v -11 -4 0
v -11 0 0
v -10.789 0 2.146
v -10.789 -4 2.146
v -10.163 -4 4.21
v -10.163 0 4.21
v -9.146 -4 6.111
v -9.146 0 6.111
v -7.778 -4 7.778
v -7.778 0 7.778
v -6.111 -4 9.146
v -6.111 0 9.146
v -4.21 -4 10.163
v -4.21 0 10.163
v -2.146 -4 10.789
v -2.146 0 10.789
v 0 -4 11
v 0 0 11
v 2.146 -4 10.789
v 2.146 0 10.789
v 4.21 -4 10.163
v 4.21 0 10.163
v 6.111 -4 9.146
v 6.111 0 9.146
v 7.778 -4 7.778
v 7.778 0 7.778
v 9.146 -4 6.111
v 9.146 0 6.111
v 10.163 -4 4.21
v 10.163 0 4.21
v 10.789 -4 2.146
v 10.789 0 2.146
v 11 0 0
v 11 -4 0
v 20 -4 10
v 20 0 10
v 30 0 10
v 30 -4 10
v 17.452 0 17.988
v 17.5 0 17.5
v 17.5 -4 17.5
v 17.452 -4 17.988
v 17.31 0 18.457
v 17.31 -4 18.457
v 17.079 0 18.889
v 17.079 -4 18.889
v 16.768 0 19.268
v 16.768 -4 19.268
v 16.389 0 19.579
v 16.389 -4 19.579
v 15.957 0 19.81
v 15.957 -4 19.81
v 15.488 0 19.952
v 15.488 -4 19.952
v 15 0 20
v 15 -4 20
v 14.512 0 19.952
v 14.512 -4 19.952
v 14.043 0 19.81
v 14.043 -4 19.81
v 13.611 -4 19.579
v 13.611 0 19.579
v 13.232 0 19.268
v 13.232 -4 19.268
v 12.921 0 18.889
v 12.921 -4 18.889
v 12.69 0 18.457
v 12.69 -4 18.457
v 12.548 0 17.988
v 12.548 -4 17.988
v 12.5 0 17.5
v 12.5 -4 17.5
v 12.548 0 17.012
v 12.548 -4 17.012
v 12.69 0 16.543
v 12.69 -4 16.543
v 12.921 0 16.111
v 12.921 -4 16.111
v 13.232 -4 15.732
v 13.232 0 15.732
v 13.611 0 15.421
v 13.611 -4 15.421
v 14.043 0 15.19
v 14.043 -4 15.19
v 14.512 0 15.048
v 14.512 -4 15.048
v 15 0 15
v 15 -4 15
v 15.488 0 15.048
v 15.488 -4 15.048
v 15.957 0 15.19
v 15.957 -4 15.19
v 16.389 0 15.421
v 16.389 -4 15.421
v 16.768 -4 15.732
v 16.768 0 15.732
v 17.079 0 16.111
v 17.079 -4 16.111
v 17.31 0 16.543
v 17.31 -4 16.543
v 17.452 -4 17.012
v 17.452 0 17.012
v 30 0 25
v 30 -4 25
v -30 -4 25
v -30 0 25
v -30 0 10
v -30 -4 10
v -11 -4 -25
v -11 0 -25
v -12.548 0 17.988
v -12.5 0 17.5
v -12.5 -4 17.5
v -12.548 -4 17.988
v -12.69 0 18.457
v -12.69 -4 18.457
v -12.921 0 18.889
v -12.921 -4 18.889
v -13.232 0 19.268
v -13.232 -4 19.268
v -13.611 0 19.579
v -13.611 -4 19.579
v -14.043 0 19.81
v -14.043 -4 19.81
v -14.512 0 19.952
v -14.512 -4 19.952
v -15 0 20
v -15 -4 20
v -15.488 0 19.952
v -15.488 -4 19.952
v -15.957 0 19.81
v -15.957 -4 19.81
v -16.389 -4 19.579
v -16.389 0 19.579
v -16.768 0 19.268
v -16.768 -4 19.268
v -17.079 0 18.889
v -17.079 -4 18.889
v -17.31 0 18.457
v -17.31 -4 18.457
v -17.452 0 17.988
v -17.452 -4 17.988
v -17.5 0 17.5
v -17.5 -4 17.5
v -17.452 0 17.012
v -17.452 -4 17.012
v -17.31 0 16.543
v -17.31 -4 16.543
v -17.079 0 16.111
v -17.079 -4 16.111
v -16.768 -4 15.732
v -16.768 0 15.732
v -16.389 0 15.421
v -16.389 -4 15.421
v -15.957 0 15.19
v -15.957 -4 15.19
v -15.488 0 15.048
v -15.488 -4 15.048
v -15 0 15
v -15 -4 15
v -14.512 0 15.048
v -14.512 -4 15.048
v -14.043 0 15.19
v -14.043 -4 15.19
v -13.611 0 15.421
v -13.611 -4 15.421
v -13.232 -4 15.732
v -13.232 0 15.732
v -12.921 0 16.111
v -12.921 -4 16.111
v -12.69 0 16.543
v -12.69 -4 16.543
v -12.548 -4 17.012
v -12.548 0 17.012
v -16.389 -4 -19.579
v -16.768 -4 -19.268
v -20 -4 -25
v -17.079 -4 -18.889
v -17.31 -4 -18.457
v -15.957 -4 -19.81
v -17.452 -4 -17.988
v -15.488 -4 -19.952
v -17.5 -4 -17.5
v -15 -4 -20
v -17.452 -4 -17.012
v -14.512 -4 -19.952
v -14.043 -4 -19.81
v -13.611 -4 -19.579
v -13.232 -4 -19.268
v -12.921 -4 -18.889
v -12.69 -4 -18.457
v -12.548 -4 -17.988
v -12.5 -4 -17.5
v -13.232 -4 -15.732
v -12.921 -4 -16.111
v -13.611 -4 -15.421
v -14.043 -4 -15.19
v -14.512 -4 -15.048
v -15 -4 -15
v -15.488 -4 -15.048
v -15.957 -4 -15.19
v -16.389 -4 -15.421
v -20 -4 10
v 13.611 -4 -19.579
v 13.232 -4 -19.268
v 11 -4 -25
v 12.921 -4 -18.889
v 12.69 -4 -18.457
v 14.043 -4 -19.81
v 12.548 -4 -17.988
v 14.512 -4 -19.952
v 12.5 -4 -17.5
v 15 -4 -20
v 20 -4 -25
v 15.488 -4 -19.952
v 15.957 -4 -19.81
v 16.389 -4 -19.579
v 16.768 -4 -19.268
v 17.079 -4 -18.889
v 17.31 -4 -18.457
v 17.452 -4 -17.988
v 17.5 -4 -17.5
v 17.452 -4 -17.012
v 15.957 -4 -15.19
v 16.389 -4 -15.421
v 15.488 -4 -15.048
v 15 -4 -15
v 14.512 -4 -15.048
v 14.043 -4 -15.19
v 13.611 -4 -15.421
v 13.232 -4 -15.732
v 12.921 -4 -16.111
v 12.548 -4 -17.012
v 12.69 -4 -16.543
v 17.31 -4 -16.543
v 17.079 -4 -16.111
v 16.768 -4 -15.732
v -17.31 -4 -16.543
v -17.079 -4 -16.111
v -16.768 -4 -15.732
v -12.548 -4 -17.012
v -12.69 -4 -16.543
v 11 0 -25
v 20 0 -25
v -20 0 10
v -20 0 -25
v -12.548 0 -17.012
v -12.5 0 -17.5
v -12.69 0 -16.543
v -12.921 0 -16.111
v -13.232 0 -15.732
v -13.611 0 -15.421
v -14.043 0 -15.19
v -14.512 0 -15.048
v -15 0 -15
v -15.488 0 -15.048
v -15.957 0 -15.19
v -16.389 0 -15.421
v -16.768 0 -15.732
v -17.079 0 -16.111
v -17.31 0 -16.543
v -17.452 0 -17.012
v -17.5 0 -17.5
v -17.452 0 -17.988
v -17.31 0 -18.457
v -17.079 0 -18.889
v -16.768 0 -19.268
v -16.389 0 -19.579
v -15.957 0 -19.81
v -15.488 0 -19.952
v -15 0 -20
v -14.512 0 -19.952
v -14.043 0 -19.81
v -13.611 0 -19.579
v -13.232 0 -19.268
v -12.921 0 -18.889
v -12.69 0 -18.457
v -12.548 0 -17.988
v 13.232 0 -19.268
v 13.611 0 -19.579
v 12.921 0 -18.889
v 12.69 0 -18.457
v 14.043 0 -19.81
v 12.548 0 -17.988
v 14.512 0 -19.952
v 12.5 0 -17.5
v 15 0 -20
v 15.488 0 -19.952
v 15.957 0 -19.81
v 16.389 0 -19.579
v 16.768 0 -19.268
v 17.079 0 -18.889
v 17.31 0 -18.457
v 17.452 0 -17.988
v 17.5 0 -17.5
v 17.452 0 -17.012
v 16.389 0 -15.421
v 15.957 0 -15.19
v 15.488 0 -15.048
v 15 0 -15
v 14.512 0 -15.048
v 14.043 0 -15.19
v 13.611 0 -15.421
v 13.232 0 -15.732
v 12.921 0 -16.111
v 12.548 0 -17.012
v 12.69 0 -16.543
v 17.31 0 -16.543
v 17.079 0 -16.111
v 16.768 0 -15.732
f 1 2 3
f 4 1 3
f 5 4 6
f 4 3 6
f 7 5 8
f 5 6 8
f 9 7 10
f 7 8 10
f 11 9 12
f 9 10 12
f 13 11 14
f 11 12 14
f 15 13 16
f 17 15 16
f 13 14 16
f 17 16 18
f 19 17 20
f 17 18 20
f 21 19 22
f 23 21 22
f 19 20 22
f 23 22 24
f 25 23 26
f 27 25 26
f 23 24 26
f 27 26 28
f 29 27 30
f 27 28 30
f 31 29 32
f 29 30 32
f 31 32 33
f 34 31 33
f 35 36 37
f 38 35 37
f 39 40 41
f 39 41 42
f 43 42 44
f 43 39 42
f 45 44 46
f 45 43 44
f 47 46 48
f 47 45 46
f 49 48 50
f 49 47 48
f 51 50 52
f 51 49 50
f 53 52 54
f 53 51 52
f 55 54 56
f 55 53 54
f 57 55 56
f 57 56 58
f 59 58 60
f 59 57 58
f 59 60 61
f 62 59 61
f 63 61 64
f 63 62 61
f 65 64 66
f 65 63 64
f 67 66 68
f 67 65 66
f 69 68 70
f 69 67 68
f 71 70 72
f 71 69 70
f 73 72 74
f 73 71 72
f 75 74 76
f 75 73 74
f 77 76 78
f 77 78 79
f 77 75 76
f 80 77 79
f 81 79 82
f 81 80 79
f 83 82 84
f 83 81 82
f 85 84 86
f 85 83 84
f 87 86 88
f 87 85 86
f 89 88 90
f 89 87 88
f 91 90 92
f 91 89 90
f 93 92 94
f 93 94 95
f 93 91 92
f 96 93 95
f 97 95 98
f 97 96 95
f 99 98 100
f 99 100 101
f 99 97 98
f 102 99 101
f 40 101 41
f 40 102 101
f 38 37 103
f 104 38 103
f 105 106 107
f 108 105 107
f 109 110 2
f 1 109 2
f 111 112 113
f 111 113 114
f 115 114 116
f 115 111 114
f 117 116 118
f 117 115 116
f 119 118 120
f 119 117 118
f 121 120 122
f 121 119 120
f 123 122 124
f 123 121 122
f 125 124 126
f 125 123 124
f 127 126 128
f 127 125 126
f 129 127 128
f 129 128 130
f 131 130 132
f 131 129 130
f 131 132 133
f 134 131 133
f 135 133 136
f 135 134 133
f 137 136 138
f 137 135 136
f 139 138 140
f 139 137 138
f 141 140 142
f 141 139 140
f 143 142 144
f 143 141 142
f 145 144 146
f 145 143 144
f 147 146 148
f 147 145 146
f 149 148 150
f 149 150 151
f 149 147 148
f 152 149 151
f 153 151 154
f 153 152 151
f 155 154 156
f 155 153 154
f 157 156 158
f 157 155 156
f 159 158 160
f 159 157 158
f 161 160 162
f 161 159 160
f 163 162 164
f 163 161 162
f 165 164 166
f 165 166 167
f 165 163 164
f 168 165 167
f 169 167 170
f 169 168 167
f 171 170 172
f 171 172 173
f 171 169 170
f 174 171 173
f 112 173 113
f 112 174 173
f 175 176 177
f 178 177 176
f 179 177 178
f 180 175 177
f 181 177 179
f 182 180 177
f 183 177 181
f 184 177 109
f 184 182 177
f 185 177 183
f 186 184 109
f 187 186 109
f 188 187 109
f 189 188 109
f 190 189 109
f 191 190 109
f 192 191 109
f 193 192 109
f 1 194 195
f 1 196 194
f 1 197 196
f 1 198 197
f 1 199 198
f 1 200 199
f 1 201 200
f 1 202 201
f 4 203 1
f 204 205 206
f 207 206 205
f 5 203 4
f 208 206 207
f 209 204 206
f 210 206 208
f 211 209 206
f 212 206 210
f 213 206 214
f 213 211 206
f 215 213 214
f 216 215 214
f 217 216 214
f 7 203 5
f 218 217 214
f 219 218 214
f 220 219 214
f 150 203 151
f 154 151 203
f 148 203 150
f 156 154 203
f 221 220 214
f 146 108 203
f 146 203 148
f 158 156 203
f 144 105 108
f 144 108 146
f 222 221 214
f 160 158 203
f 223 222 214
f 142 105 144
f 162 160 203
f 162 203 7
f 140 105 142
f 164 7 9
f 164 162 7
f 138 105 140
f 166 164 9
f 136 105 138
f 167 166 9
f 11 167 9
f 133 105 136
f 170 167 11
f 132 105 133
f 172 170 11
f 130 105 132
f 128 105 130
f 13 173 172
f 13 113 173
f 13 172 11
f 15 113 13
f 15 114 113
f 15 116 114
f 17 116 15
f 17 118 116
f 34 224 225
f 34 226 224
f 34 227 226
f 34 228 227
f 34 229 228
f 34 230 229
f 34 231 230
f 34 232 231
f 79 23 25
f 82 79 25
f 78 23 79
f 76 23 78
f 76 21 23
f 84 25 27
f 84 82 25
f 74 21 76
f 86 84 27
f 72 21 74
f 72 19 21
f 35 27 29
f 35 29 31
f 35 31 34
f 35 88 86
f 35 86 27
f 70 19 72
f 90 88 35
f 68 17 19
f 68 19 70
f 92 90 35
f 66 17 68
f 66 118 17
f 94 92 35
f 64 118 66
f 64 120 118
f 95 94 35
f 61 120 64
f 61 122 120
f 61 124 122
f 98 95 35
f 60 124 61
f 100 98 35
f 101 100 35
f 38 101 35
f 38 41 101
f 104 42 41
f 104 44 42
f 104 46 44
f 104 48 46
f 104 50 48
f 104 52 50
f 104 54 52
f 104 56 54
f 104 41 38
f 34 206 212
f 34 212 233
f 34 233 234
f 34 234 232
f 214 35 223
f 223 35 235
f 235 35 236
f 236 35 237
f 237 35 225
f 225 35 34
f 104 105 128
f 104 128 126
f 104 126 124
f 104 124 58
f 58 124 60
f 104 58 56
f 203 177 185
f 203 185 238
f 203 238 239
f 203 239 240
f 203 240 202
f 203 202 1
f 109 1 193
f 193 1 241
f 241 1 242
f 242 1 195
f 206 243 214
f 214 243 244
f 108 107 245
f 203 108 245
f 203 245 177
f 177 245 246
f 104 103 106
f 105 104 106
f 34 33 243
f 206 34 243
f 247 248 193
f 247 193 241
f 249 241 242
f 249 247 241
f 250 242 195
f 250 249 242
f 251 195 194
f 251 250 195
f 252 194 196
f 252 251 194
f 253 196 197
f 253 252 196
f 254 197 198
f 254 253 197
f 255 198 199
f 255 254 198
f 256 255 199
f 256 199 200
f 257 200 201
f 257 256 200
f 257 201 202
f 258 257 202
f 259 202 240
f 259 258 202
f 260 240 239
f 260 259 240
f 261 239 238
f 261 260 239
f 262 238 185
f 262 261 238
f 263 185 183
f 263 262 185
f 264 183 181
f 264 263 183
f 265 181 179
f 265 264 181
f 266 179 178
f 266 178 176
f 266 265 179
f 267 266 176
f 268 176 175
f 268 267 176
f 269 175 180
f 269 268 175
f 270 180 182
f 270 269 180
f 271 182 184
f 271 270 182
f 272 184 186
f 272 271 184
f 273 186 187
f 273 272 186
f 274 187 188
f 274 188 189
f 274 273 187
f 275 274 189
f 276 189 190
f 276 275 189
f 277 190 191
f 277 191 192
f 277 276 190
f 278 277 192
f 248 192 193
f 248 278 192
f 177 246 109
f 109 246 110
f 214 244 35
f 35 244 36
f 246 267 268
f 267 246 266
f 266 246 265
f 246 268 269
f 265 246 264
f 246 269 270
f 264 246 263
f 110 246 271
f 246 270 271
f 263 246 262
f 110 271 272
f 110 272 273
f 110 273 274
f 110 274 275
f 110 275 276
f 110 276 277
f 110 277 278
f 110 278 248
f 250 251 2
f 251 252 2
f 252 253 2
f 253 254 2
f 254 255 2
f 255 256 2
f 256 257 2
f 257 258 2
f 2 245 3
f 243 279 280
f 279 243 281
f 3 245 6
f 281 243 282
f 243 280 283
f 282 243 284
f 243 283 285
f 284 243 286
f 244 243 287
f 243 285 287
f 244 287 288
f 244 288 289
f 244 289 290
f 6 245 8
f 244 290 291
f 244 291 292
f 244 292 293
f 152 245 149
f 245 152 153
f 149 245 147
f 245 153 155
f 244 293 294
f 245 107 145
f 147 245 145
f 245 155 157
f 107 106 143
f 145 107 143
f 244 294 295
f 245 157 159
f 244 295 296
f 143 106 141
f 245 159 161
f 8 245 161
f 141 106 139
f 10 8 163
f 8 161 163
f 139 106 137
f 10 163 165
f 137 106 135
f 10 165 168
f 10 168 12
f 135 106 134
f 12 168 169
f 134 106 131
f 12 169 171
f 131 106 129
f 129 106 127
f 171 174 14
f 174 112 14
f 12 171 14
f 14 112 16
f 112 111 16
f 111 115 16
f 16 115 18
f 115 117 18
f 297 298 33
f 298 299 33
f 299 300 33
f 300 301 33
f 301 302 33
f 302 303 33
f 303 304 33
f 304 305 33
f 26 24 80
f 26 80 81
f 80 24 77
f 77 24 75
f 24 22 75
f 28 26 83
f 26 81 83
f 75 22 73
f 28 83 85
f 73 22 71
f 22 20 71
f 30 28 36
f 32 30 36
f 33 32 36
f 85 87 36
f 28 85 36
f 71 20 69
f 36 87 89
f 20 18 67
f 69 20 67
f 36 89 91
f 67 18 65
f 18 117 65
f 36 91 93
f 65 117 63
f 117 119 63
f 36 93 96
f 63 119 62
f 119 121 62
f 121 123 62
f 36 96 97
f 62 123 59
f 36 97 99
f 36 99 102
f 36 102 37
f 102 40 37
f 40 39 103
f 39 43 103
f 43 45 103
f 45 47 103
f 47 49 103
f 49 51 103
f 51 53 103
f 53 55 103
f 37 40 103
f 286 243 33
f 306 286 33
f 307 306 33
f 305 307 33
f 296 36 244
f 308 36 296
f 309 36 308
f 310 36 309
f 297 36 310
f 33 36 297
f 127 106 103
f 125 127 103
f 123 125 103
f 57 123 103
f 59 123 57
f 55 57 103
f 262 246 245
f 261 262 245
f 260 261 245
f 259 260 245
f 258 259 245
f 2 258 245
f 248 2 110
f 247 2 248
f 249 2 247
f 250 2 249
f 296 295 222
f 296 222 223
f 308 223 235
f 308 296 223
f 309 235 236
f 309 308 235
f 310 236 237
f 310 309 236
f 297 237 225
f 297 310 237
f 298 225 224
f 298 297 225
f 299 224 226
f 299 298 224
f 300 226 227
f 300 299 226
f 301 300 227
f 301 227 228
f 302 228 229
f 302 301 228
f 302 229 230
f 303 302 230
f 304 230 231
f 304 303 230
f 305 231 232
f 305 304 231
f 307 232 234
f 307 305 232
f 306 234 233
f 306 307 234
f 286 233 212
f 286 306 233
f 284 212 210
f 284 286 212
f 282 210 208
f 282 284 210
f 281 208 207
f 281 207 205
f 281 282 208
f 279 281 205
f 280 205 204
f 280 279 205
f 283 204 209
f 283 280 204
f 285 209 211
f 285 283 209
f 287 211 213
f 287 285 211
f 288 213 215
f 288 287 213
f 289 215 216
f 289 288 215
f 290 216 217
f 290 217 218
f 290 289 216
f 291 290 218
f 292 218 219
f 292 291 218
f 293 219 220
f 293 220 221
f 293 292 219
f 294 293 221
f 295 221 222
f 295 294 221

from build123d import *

# Parameters (mm, degrees)
F0_R     = 2.5
F1_DEPTH = 4


with BuildPart() as f1:
    # F0 (on Front) → F1 (new body)
    with BuildSketch(Plane.XZ):
        with BuildLine():
            ThreePointArc((-11, 0), (0, 11), (11, 0))
            Line((11, 0), (11, -25))
            Line((11, -25), (20, -25))
            Line((20, -25), (20, 10))
            Line((20, 10), (30, 10))
            Line((30, 10), (30, 25))
            Line((30, 25), (-30, 25))
            Line((-30, 25), (-30, 10))
            Line((-30, 10), (-20, 10))
            Line((-20, 10), (-20, -25))
            Line((-20, -25), (-11, -25))
            Line((-11, -25), (-11, 0))
        make_face()
        with Locations((-15, -17.5)):
            Circle(F0_R, mode=Mode.SUBTRACT)
        with Locations((15, -17.5)):
            Circle(F0_R, mode=Mode.SUBTRACT)
        with Locations((-15, 17.5)):
            Circle(F0_R, mode=Mode.SUBTRACT)
        with Locations((15, 17.5)):
            Circle(F0_R, mode=Mode.SUBTRACT)
    extrude(amount=F1_DEPTH)


solid = f1.part
